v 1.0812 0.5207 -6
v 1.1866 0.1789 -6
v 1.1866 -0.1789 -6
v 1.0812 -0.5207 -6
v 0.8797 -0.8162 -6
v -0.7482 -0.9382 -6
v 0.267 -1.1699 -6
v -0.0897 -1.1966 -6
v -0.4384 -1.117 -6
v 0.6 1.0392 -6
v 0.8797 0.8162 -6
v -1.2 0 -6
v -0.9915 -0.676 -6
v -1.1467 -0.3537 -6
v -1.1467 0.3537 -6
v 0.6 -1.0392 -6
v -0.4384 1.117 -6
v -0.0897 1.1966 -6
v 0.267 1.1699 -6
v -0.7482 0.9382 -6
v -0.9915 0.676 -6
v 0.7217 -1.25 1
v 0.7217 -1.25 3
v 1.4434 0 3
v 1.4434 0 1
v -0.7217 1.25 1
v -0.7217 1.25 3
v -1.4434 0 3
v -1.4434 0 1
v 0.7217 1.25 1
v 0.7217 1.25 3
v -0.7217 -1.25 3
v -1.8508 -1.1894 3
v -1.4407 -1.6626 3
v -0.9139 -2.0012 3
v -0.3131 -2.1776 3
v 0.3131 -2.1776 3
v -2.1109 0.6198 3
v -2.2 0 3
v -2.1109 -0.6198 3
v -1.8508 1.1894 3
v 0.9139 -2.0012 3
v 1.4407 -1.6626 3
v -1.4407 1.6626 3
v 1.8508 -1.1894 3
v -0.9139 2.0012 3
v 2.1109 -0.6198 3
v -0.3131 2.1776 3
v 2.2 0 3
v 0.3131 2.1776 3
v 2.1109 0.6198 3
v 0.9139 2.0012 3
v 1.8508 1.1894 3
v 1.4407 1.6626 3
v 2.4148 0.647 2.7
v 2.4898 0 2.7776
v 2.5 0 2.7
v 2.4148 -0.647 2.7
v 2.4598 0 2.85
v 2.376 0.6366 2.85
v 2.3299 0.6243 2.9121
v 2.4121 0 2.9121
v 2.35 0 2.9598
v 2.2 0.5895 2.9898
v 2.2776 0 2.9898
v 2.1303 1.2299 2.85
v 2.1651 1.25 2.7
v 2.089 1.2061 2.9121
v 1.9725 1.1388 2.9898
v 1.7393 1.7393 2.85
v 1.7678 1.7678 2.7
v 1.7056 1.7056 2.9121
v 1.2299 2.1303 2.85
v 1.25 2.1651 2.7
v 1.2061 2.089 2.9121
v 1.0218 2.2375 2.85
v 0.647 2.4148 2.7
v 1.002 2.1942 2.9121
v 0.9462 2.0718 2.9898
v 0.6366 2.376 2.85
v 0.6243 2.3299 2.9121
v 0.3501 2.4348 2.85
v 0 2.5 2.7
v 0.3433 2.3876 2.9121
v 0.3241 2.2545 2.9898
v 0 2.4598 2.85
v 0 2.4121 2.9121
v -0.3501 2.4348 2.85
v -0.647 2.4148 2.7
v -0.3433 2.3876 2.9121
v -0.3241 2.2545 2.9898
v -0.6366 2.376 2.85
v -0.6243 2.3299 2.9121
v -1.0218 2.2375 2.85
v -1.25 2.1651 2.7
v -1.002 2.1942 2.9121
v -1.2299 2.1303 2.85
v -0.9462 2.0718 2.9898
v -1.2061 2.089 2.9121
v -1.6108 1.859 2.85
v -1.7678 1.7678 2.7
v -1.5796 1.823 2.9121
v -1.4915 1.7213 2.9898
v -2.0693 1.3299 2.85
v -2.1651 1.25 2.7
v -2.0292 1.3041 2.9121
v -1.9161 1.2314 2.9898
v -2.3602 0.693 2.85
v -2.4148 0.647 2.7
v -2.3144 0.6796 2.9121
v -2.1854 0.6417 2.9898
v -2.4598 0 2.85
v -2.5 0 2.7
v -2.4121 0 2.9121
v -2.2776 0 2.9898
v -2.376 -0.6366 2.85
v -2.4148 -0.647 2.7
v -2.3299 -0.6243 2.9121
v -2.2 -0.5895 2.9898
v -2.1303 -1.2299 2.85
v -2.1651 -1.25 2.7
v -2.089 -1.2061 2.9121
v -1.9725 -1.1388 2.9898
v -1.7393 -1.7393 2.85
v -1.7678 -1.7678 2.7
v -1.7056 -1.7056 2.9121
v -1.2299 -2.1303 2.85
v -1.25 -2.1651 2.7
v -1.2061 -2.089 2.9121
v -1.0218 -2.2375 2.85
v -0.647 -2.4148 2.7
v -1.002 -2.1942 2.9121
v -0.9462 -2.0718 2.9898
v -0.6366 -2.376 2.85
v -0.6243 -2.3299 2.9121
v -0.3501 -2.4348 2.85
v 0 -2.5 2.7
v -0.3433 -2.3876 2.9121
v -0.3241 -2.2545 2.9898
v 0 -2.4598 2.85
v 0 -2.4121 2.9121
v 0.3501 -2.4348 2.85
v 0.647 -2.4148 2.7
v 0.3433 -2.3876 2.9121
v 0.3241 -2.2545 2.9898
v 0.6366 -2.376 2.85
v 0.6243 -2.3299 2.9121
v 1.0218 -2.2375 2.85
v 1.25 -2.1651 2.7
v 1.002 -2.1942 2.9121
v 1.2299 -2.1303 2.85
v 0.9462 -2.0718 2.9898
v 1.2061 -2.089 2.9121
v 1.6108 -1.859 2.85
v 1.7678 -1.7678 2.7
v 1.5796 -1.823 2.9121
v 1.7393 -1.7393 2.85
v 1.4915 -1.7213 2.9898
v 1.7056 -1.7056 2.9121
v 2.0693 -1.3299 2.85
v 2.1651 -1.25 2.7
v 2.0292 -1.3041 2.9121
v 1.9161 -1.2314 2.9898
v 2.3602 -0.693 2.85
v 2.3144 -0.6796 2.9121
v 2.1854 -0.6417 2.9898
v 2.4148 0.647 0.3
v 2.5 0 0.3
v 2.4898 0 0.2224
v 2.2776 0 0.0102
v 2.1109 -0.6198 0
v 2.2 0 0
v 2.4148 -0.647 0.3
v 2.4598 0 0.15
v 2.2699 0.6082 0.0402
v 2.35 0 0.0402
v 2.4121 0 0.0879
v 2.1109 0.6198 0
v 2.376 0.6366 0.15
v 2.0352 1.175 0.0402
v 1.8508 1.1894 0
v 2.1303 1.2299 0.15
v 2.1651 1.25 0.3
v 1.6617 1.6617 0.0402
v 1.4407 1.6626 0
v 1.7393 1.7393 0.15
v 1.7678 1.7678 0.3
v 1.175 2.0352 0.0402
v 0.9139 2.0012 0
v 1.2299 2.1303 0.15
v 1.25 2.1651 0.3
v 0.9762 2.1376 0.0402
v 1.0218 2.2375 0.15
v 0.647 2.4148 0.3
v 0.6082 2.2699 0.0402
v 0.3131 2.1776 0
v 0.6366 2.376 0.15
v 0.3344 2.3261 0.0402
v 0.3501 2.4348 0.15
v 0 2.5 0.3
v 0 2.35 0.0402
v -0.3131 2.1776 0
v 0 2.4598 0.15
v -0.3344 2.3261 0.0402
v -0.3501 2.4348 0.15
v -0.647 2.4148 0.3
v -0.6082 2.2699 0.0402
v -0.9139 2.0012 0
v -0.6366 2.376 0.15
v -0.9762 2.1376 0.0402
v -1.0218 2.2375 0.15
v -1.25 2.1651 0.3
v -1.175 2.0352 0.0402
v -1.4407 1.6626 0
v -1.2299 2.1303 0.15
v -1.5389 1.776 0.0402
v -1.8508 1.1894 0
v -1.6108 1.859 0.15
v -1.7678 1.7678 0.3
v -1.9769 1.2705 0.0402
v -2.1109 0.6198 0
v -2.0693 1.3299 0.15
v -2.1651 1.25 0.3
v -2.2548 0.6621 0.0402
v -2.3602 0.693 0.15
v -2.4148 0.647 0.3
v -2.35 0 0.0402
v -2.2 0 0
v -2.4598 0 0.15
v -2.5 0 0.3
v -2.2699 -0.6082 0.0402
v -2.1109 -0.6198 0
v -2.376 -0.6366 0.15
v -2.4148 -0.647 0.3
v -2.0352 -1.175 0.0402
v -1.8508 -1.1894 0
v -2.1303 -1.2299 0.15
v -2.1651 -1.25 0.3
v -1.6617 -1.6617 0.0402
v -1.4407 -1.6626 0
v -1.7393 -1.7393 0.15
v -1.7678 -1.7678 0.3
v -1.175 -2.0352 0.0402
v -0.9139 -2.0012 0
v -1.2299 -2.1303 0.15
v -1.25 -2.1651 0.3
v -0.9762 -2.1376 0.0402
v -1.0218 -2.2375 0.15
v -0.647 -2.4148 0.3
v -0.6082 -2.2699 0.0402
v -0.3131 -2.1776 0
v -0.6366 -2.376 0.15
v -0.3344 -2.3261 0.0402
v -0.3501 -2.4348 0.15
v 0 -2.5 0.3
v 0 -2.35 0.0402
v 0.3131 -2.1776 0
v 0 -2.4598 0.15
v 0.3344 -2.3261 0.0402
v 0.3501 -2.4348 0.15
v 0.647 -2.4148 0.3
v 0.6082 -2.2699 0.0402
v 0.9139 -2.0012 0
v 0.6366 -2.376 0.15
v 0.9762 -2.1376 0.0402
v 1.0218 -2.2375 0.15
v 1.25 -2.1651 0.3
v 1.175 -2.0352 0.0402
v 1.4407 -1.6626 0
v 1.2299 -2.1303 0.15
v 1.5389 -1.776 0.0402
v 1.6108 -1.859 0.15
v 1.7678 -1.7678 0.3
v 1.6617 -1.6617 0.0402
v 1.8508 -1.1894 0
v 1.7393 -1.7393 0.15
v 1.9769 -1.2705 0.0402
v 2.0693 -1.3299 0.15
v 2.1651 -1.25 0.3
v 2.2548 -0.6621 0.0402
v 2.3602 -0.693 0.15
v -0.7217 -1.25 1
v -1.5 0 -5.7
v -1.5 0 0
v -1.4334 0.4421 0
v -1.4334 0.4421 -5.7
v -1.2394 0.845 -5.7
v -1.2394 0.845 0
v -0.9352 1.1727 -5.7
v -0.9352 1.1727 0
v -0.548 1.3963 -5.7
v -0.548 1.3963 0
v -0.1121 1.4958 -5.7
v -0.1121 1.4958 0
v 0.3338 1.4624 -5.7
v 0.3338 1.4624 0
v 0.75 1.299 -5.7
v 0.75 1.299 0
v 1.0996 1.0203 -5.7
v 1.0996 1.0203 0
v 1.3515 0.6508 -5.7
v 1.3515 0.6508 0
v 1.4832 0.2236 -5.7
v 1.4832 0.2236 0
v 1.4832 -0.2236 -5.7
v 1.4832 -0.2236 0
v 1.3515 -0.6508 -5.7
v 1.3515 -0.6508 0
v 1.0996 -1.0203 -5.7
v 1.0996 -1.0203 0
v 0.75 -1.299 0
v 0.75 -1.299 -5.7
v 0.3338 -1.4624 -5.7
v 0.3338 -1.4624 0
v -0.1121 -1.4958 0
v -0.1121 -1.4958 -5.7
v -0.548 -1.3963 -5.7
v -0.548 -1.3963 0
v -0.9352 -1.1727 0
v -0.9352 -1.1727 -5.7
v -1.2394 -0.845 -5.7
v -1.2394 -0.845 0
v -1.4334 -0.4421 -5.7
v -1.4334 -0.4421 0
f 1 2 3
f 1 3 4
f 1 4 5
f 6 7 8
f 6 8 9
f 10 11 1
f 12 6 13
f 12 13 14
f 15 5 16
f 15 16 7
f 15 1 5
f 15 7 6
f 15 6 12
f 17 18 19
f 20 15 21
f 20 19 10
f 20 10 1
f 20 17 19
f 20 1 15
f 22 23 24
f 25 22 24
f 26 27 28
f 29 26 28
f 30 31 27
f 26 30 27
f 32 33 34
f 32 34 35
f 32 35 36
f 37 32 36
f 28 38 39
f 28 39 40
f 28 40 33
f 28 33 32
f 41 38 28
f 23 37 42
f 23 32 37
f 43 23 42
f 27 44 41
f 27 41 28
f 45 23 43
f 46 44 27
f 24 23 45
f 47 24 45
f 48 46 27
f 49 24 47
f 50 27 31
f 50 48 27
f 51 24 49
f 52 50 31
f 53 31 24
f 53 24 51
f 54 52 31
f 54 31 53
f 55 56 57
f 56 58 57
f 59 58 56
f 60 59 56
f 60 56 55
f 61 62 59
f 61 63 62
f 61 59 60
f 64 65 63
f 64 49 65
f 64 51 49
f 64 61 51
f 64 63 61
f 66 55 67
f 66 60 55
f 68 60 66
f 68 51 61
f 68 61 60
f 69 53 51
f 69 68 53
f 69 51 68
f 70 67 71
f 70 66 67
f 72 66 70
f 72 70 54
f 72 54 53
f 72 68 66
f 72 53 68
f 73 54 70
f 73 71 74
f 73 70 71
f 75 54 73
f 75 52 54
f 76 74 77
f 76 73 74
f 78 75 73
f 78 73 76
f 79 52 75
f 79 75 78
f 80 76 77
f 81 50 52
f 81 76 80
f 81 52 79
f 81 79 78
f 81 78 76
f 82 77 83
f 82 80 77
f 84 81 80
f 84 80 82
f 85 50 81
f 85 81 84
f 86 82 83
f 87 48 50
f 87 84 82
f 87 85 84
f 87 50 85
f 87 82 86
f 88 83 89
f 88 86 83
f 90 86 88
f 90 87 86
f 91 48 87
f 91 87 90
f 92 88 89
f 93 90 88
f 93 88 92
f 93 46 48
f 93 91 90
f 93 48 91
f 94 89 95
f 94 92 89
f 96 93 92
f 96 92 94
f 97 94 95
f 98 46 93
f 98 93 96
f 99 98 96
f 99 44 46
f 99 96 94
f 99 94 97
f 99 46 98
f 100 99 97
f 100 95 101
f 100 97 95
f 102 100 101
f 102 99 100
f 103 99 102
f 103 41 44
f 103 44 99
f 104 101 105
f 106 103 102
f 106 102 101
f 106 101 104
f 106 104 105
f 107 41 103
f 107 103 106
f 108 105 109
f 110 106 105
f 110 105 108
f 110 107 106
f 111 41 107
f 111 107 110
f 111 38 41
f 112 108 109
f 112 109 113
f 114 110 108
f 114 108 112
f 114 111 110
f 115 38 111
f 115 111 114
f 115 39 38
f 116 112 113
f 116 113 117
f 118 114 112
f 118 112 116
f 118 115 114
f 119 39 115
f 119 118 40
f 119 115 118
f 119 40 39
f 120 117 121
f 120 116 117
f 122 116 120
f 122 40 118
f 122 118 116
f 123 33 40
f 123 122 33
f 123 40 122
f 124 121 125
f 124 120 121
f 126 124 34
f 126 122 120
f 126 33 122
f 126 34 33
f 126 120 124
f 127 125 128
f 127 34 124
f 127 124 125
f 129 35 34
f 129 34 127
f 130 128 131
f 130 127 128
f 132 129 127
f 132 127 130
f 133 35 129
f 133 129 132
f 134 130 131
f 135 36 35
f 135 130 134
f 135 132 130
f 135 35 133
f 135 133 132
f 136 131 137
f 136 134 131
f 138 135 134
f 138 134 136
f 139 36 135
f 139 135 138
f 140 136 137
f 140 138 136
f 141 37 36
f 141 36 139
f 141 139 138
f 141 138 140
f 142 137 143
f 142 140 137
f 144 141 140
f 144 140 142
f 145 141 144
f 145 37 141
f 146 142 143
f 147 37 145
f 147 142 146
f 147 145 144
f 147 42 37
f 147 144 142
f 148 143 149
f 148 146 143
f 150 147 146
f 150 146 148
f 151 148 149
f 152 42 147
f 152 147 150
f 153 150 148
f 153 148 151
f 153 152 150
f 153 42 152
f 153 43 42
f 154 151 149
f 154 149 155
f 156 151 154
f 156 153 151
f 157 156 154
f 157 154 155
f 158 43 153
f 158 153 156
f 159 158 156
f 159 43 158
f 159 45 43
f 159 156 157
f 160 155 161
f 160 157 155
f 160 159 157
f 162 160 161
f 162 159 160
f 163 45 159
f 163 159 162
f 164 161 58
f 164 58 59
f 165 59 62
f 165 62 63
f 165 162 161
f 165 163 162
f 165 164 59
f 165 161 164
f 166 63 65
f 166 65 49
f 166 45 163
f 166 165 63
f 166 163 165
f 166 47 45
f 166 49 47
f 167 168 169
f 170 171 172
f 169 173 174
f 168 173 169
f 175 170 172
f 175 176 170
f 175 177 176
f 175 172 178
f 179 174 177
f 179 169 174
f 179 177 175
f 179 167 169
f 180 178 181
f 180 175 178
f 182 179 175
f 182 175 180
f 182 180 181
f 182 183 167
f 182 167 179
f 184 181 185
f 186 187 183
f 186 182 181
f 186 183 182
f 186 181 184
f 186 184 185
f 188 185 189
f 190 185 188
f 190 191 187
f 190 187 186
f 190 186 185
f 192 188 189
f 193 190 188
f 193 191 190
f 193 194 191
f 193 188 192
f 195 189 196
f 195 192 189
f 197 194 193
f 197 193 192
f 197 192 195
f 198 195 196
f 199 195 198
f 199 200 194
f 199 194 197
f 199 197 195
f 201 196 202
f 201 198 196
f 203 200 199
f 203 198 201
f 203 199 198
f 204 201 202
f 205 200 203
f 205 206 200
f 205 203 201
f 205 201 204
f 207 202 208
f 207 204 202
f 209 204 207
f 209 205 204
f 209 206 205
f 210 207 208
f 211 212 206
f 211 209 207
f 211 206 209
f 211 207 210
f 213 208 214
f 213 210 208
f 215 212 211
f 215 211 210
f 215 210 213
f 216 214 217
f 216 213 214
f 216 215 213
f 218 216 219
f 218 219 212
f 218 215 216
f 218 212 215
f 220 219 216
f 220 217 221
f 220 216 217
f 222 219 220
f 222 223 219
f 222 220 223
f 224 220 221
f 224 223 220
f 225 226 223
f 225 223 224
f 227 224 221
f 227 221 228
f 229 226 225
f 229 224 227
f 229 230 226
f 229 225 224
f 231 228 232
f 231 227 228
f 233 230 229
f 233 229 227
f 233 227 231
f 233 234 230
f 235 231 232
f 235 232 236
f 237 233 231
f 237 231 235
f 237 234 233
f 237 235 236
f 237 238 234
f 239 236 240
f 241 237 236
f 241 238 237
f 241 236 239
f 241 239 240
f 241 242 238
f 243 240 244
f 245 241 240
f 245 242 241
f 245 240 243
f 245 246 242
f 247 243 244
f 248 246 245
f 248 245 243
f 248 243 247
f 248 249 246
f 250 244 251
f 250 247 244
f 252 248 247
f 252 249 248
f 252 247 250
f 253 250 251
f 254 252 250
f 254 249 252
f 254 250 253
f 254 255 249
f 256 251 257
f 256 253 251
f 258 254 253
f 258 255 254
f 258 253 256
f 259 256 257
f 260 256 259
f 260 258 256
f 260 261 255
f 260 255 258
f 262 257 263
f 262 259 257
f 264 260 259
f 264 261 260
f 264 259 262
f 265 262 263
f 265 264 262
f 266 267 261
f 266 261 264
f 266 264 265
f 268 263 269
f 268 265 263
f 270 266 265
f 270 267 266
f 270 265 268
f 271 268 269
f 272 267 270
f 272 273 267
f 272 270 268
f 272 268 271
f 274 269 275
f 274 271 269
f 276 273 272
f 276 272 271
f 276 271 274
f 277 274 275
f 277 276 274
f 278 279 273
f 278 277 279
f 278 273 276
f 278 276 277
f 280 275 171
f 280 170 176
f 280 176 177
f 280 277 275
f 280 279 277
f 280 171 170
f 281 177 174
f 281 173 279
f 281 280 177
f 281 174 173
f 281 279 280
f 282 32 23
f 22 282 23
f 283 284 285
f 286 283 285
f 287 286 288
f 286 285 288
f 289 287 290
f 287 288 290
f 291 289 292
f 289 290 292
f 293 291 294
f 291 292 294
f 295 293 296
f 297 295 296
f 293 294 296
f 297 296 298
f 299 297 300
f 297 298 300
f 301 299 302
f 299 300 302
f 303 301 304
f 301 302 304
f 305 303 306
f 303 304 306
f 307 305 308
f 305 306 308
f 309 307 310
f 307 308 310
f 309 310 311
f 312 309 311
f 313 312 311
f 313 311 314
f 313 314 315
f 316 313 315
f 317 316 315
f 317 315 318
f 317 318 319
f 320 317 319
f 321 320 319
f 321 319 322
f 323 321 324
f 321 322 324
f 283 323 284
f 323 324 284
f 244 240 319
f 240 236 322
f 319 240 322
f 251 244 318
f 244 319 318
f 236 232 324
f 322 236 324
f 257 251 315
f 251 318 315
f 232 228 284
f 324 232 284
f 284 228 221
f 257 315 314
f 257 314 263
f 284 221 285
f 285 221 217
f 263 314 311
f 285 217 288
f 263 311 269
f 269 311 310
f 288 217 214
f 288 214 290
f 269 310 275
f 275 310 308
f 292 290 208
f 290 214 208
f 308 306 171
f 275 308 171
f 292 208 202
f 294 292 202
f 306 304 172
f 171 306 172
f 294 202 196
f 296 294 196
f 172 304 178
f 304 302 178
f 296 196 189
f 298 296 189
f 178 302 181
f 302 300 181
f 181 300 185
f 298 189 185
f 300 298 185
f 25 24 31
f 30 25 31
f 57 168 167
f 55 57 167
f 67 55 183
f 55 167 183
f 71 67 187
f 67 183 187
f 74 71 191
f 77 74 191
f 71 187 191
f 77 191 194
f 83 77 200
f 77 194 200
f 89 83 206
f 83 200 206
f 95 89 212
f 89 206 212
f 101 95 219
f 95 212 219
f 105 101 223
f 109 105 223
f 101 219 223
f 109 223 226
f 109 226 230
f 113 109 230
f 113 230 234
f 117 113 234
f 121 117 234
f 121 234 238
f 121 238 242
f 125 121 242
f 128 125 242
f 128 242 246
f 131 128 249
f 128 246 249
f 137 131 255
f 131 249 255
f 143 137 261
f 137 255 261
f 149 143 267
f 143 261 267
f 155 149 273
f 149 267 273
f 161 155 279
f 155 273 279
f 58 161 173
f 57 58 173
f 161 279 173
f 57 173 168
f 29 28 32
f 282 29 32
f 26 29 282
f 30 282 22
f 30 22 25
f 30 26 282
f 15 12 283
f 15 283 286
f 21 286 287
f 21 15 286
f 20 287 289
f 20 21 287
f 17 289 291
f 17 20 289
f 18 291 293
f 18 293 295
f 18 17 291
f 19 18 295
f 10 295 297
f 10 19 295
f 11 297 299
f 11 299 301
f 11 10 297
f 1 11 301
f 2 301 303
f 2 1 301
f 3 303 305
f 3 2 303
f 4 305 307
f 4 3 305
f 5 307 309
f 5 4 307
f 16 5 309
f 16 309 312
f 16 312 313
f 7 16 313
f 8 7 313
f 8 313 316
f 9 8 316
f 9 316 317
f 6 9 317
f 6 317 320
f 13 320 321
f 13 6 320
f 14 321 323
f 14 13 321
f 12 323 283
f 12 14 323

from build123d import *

# Parameters (mm, degrees)
SKETCH_1_R          = 2.5
EXTRUDE_1_DEPTH     = 3
SKETCH_2_R          = 1.5
EXTRUDE_2_DEPTH     = 6
CUT_EXTRUDE_1_DEPTH = 2
CHAMFER_1_SIZE      = 0.3
FILLET_1_R          = 0.3


with BuildPart() as part:
    # 草图1 → 凸台-拉伸1 (new body)
    with BuildSketch(Plane.XY):
        Circle(SKETCH_1_R)
    extrude(amount=EXTRUDE_1_DEPTH)

    # 草图2 → 凸台-拉伸2 (add)
    with BuildSketch(Plane(origin=(0, 0, 0), x_dir=(-1, 0, 0), z_dir=(0, 0, -1))):
        Circle(SKETCH_2_R)
    extrude(amount=EXTRUDE_2_DEPTH)

    # 草图3 → 切除-拉伸1 (cut)
    with BuildSketch(Plane.XY.offset(3)):
        Polygon((1.443375673, 0), (0.721687836, 1.25), (-0.721687836, 1.25), (-1.443375673, 0), (-0.721687836, -1.25), (0.721687836, -1.25), align=None)
    extrude(amount=-CUT_EXTRUDE_1_DEPTH, mode=Mode.SUBTRACT)

    # 倒角1
    chamfer_1_edges = [part.edges().sort_by_distance(p)[0] for p in [
        (1.5, 0, -6),
    ]]
    chamfer(chamfer_1_edges, length=CHAMFER_1_SIZE)

    # 圆角1
    fillet_1_edges = [part.edges().sort_by_distance(p)[0] for p in [
        (-2.5, 0, 0),
        (-2.5, 0, 3),
    ]]
    fillet(fillet_1_edges, radius=FILLET_1_R)


solid = part.part
